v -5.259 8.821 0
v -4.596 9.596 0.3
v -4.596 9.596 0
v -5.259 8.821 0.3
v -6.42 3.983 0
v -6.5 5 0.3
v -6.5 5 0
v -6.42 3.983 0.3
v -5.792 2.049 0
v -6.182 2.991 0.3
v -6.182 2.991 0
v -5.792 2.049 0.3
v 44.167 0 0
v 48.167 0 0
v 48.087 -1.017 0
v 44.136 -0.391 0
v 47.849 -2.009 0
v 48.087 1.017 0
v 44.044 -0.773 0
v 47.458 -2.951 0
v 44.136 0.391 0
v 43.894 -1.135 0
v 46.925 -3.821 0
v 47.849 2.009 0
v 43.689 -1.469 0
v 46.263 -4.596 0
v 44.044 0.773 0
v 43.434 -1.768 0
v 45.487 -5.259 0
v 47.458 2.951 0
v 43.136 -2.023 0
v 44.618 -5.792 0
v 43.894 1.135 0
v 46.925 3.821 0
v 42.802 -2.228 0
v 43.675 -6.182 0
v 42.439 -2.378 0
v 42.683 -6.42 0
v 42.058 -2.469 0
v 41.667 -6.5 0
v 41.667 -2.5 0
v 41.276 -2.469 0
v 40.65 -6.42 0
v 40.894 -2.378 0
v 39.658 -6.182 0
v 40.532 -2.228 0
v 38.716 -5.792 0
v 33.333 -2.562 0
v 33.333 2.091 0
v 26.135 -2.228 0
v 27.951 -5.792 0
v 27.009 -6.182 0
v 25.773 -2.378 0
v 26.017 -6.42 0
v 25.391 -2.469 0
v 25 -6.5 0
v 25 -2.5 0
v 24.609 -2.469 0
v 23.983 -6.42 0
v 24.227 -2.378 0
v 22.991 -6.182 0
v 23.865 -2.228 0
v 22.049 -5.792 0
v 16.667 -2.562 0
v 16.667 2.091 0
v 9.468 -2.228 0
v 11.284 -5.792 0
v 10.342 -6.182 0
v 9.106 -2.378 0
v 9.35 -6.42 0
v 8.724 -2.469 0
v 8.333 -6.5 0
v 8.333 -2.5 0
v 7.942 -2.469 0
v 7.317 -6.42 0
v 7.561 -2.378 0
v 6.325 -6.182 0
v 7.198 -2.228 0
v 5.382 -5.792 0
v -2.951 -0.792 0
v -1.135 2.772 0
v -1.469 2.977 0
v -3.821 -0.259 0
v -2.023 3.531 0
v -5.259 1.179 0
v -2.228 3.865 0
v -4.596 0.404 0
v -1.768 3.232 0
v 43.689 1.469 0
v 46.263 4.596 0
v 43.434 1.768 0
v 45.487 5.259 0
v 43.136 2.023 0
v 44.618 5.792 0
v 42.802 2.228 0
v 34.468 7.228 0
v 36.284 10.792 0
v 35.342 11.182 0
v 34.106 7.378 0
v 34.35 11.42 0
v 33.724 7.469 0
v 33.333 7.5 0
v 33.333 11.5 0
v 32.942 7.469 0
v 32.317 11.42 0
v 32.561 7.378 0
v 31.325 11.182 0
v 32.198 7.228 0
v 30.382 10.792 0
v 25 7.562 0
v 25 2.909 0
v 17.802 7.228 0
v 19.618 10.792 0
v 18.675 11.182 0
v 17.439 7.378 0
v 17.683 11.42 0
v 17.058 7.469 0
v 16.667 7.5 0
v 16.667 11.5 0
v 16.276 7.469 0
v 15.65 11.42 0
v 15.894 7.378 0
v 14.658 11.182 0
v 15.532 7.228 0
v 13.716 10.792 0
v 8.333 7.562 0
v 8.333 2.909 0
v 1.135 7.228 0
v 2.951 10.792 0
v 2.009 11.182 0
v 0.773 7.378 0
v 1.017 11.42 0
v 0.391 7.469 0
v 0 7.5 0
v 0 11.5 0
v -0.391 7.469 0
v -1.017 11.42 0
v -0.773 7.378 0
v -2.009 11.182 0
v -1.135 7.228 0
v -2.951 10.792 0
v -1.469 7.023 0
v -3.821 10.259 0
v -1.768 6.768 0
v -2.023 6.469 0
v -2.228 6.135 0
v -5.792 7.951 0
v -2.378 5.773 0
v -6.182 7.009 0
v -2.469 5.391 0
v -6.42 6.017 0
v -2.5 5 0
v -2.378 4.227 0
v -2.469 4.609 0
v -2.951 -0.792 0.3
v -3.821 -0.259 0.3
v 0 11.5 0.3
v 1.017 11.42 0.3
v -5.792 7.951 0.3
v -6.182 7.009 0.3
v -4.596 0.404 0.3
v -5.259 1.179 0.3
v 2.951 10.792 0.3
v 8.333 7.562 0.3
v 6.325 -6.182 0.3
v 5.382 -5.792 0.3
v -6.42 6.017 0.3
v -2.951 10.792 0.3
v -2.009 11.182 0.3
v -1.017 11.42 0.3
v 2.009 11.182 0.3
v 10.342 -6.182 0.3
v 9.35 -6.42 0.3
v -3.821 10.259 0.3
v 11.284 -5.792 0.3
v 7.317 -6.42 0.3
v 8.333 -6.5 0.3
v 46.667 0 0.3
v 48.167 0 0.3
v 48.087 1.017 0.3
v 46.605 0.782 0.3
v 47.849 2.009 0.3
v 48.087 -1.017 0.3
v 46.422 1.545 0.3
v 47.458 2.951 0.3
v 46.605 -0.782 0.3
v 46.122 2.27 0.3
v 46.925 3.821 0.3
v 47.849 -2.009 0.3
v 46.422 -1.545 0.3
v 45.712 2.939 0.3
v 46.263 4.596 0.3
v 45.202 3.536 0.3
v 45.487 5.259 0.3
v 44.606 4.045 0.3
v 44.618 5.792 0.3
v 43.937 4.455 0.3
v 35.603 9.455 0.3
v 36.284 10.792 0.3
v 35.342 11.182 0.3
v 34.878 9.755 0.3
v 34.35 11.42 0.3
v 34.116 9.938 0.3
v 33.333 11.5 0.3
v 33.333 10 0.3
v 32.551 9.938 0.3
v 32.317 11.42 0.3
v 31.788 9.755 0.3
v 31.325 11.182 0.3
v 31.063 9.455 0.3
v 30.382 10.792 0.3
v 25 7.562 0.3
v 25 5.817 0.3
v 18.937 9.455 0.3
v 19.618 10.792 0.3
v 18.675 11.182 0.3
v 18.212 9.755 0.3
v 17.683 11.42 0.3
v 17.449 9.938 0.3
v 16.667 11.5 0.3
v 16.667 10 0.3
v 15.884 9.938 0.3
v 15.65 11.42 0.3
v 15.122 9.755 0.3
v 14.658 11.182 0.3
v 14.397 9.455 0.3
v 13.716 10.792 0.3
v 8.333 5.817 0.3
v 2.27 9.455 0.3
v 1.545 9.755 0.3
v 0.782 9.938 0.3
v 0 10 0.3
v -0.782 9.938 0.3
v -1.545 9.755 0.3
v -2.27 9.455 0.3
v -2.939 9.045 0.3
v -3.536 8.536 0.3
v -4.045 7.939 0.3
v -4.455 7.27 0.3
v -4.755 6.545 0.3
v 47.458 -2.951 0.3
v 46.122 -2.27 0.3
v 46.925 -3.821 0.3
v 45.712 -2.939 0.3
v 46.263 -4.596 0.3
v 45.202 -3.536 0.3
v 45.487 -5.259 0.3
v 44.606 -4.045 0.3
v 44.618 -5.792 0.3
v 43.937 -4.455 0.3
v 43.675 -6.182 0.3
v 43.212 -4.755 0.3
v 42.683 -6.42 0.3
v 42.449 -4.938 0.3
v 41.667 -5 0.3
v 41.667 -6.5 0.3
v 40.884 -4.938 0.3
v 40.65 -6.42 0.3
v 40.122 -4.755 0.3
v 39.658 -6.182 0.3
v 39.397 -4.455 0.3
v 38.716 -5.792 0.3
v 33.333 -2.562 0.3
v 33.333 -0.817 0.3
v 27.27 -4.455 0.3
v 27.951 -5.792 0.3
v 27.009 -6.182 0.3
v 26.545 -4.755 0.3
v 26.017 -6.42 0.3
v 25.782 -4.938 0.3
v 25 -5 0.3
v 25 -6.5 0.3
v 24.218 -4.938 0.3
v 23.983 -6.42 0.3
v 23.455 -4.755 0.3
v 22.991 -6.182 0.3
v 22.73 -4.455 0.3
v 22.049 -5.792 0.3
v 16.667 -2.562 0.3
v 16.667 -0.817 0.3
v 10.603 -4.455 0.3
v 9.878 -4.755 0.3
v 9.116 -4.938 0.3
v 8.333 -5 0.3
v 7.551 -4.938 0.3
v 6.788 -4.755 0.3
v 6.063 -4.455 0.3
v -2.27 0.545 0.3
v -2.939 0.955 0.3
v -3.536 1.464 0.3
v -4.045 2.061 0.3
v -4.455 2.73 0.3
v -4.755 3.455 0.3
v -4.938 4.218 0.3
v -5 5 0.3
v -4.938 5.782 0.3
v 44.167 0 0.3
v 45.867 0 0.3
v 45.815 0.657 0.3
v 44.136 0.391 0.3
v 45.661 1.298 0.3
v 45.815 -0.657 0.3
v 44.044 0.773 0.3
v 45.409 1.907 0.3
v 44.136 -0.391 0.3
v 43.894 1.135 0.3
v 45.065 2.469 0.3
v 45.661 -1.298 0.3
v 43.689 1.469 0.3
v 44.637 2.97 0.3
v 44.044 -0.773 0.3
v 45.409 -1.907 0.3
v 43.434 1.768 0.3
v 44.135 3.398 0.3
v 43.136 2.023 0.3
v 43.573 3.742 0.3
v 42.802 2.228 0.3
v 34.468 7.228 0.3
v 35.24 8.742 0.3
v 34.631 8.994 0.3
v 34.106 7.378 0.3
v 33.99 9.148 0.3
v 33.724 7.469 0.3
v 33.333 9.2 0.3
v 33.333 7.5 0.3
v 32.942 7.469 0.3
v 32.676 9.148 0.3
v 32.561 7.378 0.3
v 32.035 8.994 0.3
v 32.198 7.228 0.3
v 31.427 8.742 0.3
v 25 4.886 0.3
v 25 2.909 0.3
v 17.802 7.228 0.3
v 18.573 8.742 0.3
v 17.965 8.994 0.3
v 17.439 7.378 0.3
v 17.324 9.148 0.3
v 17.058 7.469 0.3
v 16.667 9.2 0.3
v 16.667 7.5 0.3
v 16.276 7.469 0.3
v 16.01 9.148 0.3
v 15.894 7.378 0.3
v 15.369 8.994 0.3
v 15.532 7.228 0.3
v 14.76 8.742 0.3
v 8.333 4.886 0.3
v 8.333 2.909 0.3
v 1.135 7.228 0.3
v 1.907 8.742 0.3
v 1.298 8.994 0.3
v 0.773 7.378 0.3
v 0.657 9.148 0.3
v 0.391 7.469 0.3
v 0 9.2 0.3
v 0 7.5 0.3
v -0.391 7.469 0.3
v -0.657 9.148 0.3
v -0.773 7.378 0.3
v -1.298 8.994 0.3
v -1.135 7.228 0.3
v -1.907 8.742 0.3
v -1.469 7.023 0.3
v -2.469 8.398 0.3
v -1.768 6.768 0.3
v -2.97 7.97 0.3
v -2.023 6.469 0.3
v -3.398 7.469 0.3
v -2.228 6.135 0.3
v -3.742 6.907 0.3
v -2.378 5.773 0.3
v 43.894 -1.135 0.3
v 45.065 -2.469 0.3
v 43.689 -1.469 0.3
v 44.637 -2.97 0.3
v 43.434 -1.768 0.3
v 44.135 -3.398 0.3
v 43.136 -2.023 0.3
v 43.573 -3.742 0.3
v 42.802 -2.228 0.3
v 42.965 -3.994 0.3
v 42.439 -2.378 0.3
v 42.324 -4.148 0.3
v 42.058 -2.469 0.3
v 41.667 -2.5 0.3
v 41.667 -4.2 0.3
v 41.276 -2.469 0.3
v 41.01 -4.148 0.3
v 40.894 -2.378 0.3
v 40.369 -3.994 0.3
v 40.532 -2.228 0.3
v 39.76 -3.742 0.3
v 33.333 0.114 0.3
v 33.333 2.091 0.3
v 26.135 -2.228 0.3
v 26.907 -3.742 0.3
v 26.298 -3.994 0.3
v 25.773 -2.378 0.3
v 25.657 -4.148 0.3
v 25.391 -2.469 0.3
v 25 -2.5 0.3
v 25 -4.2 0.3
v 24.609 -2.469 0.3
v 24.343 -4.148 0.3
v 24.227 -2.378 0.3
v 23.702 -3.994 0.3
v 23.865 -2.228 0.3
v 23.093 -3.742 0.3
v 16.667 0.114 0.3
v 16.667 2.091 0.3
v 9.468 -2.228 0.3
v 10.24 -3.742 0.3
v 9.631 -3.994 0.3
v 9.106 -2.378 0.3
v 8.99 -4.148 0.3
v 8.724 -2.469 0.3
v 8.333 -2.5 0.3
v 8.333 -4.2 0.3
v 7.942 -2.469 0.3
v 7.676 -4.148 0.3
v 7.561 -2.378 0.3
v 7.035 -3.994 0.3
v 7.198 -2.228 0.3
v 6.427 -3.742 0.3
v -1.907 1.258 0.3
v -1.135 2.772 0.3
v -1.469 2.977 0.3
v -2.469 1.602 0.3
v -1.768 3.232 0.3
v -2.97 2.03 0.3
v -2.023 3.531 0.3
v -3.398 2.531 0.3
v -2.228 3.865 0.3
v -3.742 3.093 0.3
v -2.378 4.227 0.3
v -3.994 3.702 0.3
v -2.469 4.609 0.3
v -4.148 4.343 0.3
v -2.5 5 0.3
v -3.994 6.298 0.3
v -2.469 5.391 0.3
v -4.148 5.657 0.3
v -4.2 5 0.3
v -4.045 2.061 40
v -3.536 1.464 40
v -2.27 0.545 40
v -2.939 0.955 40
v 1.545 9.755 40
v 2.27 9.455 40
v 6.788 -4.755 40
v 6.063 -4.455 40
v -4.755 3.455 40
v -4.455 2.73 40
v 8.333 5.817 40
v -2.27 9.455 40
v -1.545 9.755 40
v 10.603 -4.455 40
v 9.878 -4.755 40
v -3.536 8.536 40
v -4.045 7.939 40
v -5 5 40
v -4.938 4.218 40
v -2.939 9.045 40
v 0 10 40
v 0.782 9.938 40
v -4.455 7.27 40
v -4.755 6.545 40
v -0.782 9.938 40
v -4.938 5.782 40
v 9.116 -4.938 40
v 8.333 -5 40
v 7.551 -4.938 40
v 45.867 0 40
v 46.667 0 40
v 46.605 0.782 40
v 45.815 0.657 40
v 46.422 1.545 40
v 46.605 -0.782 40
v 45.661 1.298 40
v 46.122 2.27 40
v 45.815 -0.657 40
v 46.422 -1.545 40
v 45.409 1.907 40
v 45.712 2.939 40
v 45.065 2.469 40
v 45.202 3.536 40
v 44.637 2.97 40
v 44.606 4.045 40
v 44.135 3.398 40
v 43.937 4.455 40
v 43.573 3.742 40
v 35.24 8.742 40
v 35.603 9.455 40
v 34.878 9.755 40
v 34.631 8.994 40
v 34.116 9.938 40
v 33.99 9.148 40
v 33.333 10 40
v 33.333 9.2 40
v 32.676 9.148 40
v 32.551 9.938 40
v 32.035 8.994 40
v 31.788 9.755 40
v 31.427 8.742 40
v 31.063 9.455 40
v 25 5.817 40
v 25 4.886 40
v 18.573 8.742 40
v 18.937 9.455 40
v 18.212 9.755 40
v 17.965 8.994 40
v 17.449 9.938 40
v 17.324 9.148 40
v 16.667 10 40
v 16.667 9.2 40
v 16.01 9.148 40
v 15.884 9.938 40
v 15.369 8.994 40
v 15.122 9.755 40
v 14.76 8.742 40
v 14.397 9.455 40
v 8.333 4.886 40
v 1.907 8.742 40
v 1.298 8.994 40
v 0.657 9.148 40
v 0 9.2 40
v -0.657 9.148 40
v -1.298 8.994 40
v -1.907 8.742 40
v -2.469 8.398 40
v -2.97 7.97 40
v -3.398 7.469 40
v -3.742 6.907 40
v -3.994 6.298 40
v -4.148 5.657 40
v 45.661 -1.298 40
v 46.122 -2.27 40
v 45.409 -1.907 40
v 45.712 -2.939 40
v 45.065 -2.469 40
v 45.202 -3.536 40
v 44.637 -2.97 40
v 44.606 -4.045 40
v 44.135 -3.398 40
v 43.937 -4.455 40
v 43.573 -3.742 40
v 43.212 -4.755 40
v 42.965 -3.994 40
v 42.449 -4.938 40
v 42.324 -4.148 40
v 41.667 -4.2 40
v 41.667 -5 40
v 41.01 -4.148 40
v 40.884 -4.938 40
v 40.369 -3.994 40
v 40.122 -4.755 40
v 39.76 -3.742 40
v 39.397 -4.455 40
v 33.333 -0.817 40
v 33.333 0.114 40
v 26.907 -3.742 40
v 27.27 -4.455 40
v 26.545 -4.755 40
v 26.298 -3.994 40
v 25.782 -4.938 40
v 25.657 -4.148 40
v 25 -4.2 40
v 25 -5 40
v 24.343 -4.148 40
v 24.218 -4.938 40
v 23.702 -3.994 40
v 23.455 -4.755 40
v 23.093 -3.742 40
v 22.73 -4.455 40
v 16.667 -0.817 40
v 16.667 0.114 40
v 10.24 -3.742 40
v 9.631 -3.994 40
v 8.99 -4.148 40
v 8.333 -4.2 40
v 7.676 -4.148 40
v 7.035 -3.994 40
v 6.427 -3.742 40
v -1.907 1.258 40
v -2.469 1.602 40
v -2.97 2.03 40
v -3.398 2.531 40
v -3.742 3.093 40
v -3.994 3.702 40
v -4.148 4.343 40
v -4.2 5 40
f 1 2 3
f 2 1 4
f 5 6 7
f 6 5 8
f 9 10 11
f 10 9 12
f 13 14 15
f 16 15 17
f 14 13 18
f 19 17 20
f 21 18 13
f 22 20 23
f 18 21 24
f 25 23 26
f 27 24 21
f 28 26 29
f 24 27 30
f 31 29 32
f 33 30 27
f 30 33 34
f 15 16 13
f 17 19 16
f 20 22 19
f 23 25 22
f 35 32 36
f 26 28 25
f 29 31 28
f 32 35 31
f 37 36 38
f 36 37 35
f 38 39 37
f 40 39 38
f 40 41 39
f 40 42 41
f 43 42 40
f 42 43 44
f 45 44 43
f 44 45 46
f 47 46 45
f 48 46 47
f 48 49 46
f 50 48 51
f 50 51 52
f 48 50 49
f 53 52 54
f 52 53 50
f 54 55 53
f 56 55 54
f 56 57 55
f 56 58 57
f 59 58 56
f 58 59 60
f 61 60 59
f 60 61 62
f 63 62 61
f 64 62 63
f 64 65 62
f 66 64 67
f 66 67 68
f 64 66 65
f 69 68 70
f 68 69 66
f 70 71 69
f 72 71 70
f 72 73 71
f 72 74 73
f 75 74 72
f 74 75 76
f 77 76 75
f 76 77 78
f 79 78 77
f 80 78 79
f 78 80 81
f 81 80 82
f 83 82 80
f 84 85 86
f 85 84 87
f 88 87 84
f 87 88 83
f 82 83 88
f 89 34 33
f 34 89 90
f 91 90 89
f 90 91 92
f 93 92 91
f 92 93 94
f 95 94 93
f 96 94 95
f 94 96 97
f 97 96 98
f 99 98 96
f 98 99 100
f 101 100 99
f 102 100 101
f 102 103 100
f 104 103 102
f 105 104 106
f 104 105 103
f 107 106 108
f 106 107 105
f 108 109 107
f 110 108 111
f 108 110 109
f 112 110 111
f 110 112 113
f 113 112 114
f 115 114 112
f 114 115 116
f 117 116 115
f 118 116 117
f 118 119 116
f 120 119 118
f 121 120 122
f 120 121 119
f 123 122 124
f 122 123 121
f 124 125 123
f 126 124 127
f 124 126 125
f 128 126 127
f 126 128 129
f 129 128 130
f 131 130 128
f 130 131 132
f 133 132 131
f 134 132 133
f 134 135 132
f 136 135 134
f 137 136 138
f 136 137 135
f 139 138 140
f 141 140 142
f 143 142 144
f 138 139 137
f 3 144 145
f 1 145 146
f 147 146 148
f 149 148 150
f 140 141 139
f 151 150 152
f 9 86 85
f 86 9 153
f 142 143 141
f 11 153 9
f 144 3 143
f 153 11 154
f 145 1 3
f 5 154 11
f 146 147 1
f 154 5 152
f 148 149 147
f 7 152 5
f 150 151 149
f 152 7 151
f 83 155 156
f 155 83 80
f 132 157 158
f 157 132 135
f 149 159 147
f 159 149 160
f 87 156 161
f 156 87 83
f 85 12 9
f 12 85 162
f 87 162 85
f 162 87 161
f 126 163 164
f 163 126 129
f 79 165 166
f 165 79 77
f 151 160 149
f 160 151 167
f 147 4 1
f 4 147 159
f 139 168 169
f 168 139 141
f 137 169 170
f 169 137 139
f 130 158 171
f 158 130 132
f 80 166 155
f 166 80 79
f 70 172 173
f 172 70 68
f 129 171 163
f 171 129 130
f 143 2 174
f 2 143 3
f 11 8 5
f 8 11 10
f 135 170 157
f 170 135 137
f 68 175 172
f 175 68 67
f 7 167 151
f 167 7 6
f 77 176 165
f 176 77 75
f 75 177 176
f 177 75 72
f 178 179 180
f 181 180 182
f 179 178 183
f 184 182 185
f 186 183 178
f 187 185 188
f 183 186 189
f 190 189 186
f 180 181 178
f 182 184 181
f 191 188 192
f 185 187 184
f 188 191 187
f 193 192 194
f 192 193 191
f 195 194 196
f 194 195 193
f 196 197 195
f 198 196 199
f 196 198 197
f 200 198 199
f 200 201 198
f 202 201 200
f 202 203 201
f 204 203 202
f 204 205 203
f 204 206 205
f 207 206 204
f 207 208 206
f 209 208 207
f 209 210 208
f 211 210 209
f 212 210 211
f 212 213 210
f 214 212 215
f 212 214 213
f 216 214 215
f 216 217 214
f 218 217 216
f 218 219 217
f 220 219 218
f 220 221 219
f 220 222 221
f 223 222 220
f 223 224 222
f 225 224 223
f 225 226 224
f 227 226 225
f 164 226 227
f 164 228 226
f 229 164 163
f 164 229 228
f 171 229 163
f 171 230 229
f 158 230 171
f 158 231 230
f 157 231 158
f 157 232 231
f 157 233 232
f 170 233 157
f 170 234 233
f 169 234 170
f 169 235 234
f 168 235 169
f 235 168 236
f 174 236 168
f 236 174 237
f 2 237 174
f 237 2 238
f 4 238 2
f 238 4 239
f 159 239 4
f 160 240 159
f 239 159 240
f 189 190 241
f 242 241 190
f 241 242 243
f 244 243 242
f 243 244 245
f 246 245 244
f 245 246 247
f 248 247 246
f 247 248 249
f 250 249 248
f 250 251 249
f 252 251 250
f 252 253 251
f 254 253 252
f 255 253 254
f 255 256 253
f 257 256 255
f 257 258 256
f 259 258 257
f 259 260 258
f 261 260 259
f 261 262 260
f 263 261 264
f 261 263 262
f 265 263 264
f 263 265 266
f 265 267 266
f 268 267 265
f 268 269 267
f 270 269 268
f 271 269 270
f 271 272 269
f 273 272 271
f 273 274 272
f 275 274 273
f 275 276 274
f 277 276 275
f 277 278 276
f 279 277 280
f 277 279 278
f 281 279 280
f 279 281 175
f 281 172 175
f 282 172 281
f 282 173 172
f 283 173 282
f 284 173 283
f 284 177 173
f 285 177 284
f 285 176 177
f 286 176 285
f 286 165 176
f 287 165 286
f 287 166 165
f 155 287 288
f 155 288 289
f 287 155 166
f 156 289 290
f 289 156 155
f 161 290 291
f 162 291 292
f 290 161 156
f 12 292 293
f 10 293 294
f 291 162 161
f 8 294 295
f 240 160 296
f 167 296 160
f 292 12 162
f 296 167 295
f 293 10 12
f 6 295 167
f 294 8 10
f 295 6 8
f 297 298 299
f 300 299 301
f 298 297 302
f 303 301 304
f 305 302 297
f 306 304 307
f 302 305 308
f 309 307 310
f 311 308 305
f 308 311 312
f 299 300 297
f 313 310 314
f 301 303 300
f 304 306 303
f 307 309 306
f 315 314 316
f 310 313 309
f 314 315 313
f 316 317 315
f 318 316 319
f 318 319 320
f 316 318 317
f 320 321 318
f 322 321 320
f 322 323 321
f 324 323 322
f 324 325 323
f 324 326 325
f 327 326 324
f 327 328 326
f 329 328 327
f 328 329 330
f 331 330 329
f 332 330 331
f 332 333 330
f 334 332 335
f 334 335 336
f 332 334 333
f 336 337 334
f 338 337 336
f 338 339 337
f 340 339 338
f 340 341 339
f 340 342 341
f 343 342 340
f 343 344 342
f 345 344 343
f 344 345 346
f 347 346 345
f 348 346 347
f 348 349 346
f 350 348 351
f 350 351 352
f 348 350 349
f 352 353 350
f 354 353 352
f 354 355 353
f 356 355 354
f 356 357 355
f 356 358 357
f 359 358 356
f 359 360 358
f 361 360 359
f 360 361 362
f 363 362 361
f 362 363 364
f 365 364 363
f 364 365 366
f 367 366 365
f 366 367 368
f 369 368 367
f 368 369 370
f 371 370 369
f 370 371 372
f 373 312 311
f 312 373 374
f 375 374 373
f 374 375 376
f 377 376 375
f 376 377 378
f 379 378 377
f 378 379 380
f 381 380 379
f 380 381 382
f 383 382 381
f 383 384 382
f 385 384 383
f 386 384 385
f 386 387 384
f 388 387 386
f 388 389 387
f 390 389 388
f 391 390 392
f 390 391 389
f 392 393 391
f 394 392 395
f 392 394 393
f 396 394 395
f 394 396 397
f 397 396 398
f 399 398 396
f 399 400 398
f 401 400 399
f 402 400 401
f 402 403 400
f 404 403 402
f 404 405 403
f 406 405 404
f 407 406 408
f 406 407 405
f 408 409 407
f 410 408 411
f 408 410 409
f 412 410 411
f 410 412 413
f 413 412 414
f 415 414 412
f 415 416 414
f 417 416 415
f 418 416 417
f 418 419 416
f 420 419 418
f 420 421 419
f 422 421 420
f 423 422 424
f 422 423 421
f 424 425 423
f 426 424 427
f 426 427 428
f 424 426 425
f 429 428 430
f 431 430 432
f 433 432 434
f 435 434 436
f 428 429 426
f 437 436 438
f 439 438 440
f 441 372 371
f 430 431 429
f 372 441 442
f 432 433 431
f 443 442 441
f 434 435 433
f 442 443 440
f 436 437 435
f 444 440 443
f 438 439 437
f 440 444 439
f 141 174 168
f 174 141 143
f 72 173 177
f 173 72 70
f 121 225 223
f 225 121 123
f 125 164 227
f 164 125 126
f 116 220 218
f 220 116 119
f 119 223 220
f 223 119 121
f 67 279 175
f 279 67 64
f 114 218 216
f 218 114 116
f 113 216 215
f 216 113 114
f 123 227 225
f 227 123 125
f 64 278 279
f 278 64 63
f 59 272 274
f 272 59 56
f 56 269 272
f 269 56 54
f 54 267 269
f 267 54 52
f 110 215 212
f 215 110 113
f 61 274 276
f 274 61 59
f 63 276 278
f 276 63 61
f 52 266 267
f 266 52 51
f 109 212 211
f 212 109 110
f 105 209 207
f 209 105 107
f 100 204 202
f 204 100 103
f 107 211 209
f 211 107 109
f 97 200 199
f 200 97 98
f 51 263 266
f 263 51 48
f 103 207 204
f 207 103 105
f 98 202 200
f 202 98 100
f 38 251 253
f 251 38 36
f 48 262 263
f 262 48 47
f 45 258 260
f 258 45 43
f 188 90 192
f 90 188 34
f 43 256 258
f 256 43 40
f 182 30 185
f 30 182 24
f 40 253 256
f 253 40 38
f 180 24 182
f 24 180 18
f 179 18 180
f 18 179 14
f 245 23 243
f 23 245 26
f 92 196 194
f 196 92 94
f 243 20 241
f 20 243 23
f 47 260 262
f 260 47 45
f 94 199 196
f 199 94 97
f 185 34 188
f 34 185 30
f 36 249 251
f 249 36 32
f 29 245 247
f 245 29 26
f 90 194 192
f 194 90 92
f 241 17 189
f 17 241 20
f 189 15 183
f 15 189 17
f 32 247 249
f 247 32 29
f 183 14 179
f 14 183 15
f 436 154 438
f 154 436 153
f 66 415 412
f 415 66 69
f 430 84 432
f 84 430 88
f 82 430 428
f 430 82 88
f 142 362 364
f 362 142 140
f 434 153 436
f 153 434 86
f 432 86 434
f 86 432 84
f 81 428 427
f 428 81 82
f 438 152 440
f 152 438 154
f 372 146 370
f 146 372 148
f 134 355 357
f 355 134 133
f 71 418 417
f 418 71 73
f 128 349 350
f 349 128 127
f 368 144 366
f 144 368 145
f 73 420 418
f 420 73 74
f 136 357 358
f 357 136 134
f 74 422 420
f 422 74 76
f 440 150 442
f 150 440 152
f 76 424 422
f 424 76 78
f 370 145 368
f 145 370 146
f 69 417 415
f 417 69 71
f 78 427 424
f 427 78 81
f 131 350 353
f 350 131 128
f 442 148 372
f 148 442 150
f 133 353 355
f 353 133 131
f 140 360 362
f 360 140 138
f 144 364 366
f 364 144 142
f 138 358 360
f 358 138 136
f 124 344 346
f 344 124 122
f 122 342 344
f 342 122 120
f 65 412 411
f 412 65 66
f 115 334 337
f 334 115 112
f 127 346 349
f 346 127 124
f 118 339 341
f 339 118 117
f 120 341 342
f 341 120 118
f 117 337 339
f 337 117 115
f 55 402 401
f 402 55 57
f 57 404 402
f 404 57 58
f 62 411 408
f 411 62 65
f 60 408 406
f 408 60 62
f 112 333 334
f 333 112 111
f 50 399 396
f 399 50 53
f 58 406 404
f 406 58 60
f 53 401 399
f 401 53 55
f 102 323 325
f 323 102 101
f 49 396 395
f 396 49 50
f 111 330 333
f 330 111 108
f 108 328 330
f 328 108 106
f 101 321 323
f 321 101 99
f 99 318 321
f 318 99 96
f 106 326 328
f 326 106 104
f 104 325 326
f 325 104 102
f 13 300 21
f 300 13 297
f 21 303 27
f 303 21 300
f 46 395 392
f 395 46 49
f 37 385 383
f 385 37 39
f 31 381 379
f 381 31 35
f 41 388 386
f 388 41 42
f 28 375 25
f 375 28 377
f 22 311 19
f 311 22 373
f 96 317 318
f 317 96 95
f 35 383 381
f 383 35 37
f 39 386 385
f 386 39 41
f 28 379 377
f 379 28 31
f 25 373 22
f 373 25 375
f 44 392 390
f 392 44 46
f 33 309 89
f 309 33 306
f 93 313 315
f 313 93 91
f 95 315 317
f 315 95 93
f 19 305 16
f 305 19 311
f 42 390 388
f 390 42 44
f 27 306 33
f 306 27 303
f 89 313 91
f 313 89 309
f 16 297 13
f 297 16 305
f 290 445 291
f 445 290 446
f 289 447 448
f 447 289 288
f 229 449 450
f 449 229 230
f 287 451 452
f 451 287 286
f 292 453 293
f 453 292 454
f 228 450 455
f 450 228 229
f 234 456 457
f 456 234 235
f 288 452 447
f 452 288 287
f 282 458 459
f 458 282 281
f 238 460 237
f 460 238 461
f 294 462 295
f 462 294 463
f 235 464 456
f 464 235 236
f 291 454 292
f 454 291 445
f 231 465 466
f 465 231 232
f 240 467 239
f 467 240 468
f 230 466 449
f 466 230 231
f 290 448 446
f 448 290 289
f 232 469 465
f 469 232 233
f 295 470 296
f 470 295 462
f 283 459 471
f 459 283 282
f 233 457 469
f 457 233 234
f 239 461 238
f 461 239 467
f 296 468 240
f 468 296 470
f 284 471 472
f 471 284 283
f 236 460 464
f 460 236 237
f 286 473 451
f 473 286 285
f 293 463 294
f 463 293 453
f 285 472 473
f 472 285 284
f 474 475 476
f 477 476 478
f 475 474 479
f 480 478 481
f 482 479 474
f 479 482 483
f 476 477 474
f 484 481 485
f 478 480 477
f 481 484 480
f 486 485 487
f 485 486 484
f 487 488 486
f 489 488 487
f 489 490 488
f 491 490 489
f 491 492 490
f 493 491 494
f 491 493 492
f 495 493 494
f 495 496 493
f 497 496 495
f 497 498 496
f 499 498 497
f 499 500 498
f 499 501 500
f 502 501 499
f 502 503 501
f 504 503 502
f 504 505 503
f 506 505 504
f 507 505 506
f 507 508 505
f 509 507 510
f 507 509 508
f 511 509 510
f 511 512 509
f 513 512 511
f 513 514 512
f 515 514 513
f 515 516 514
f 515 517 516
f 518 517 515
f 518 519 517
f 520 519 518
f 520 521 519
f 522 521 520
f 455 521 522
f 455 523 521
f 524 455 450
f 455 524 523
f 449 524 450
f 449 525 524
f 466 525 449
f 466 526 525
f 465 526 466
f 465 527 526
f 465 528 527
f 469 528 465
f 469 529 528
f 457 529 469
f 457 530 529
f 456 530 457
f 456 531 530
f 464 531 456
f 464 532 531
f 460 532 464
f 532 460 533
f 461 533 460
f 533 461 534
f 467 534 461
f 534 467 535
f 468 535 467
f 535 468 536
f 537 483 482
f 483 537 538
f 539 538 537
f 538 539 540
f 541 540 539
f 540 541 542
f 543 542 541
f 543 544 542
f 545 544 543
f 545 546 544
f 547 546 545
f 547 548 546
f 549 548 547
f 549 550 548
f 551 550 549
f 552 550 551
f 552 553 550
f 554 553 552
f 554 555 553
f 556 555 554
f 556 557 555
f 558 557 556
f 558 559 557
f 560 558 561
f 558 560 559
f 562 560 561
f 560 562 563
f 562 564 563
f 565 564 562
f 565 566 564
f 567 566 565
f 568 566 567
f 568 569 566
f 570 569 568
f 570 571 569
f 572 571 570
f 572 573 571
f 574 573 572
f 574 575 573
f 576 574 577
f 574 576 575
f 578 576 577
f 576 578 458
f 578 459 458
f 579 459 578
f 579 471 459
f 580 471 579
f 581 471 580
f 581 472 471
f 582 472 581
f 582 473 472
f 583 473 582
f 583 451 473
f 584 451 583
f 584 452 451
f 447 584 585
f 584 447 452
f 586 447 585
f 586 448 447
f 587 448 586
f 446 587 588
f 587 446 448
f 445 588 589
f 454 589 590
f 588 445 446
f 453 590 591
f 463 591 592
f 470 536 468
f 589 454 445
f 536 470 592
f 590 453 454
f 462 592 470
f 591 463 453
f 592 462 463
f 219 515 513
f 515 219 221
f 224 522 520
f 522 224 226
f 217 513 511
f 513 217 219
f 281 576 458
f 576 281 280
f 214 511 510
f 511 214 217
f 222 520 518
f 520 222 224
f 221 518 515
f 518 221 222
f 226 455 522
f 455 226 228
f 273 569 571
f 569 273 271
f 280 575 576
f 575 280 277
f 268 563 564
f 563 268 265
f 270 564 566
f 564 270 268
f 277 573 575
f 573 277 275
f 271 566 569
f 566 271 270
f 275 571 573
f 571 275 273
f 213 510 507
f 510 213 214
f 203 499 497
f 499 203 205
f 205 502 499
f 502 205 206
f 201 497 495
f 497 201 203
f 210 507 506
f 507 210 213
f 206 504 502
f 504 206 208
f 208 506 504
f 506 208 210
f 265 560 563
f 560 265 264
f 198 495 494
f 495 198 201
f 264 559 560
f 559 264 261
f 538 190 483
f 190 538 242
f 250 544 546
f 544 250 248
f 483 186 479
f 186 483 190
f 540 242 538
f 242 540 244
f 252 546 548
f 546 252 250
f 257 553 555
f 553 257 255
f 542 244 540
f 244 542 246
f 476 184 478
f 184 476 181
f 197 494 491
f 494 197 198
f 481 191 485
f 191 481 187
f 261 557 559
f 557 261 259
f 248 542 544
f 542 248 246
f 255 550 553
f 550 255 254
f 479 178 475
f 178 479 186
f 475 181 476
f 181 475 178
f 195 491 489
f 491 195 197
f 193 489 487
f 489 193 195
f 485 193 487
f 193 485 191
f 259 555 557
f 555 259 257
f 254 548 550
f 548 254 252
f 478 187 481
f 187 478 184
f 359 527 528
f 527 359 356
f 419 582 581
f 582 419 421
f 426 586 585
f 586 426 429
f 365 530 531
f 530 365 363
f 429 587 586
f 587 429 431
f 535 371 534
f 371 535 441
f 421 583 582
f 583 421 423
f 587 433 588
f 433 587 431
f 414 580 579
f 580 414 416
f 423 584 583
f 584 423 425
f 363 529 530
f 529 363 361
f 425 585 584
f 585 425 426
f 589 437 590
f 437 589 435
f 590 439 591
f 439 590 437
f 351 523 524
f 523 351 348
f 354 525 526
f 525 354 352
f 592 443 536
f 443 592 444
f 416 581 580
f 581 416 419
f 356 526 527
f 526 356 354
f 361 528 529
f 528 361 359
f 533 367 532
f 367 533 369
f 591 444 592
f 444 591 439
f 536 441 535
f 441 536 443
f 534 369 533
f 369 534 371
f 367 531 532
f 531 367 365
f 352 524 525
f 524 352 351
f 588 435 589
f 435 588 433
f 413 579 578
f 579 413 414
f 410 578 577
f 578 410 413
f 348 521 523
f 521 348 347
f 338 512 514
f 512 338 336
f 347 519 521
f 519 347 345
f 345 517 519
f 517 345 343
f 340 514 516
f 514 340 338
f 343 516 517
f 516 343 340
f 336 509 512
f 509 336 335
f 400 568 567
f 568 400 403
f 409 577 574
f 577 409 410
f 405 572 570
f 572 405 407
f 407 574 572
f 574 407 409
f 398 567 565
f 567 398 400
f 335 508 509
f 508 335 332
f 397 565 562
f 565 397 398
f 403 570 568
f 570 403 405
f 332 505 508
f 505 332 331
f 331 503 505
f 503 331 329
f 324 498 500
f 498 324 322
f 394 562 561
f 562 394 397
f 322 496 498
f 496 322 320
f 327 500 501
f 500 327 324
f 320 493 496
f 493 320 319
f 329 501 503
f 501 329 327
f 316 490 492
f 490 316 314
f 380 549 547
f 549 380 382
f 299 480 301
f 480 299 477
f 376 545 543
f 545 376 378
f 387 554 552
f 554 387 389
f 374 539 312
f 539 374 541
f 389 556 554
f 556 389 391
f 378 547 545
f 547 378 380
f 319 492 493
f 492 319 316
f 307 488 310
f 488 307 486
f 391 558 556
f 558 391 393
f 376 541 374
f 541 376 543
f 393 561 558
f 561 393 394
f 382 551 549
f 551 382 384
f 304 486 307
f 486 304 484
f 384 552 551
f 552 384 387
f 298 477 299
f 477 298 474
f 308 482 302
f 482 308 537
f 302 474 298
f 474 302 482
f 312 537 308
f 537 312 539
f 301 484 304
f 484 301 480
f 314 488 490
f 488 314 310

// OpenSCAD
$fn=40;

snake(ht=40);

module snake(ht) {
   difference() {
      snakePart(len=50,dia=13,ht=0.3);
      translate([0,0,-0.1]) snakePart(len=50,dia=5,ht=0.5);
   }
   difference() {
      snakePart(len=50,dia=10,ht=ht);
      translate([0,0,-0.5]) snakePart(len=50,dia=8.4,ht=ht+1);
   }
}

module snakePart(len = 50, dia=10,ht=40) {
   for (i=[0:4]) {
      if (i % 2) hull() {
         translate([i*len/6,0,0]) cylinder(h=ht,d=dia);
         translate([(i+1)*len/6,5,0]) cylinder(h=ht,d=dia);
      }
      else hull() {
         translate([i*len/6,5,0]) cylinder(h=ht,d=dia);
         translate([(i+1)*len/6,0,0]) cylinder(h=ht,d=dia);
      }
   }
}
